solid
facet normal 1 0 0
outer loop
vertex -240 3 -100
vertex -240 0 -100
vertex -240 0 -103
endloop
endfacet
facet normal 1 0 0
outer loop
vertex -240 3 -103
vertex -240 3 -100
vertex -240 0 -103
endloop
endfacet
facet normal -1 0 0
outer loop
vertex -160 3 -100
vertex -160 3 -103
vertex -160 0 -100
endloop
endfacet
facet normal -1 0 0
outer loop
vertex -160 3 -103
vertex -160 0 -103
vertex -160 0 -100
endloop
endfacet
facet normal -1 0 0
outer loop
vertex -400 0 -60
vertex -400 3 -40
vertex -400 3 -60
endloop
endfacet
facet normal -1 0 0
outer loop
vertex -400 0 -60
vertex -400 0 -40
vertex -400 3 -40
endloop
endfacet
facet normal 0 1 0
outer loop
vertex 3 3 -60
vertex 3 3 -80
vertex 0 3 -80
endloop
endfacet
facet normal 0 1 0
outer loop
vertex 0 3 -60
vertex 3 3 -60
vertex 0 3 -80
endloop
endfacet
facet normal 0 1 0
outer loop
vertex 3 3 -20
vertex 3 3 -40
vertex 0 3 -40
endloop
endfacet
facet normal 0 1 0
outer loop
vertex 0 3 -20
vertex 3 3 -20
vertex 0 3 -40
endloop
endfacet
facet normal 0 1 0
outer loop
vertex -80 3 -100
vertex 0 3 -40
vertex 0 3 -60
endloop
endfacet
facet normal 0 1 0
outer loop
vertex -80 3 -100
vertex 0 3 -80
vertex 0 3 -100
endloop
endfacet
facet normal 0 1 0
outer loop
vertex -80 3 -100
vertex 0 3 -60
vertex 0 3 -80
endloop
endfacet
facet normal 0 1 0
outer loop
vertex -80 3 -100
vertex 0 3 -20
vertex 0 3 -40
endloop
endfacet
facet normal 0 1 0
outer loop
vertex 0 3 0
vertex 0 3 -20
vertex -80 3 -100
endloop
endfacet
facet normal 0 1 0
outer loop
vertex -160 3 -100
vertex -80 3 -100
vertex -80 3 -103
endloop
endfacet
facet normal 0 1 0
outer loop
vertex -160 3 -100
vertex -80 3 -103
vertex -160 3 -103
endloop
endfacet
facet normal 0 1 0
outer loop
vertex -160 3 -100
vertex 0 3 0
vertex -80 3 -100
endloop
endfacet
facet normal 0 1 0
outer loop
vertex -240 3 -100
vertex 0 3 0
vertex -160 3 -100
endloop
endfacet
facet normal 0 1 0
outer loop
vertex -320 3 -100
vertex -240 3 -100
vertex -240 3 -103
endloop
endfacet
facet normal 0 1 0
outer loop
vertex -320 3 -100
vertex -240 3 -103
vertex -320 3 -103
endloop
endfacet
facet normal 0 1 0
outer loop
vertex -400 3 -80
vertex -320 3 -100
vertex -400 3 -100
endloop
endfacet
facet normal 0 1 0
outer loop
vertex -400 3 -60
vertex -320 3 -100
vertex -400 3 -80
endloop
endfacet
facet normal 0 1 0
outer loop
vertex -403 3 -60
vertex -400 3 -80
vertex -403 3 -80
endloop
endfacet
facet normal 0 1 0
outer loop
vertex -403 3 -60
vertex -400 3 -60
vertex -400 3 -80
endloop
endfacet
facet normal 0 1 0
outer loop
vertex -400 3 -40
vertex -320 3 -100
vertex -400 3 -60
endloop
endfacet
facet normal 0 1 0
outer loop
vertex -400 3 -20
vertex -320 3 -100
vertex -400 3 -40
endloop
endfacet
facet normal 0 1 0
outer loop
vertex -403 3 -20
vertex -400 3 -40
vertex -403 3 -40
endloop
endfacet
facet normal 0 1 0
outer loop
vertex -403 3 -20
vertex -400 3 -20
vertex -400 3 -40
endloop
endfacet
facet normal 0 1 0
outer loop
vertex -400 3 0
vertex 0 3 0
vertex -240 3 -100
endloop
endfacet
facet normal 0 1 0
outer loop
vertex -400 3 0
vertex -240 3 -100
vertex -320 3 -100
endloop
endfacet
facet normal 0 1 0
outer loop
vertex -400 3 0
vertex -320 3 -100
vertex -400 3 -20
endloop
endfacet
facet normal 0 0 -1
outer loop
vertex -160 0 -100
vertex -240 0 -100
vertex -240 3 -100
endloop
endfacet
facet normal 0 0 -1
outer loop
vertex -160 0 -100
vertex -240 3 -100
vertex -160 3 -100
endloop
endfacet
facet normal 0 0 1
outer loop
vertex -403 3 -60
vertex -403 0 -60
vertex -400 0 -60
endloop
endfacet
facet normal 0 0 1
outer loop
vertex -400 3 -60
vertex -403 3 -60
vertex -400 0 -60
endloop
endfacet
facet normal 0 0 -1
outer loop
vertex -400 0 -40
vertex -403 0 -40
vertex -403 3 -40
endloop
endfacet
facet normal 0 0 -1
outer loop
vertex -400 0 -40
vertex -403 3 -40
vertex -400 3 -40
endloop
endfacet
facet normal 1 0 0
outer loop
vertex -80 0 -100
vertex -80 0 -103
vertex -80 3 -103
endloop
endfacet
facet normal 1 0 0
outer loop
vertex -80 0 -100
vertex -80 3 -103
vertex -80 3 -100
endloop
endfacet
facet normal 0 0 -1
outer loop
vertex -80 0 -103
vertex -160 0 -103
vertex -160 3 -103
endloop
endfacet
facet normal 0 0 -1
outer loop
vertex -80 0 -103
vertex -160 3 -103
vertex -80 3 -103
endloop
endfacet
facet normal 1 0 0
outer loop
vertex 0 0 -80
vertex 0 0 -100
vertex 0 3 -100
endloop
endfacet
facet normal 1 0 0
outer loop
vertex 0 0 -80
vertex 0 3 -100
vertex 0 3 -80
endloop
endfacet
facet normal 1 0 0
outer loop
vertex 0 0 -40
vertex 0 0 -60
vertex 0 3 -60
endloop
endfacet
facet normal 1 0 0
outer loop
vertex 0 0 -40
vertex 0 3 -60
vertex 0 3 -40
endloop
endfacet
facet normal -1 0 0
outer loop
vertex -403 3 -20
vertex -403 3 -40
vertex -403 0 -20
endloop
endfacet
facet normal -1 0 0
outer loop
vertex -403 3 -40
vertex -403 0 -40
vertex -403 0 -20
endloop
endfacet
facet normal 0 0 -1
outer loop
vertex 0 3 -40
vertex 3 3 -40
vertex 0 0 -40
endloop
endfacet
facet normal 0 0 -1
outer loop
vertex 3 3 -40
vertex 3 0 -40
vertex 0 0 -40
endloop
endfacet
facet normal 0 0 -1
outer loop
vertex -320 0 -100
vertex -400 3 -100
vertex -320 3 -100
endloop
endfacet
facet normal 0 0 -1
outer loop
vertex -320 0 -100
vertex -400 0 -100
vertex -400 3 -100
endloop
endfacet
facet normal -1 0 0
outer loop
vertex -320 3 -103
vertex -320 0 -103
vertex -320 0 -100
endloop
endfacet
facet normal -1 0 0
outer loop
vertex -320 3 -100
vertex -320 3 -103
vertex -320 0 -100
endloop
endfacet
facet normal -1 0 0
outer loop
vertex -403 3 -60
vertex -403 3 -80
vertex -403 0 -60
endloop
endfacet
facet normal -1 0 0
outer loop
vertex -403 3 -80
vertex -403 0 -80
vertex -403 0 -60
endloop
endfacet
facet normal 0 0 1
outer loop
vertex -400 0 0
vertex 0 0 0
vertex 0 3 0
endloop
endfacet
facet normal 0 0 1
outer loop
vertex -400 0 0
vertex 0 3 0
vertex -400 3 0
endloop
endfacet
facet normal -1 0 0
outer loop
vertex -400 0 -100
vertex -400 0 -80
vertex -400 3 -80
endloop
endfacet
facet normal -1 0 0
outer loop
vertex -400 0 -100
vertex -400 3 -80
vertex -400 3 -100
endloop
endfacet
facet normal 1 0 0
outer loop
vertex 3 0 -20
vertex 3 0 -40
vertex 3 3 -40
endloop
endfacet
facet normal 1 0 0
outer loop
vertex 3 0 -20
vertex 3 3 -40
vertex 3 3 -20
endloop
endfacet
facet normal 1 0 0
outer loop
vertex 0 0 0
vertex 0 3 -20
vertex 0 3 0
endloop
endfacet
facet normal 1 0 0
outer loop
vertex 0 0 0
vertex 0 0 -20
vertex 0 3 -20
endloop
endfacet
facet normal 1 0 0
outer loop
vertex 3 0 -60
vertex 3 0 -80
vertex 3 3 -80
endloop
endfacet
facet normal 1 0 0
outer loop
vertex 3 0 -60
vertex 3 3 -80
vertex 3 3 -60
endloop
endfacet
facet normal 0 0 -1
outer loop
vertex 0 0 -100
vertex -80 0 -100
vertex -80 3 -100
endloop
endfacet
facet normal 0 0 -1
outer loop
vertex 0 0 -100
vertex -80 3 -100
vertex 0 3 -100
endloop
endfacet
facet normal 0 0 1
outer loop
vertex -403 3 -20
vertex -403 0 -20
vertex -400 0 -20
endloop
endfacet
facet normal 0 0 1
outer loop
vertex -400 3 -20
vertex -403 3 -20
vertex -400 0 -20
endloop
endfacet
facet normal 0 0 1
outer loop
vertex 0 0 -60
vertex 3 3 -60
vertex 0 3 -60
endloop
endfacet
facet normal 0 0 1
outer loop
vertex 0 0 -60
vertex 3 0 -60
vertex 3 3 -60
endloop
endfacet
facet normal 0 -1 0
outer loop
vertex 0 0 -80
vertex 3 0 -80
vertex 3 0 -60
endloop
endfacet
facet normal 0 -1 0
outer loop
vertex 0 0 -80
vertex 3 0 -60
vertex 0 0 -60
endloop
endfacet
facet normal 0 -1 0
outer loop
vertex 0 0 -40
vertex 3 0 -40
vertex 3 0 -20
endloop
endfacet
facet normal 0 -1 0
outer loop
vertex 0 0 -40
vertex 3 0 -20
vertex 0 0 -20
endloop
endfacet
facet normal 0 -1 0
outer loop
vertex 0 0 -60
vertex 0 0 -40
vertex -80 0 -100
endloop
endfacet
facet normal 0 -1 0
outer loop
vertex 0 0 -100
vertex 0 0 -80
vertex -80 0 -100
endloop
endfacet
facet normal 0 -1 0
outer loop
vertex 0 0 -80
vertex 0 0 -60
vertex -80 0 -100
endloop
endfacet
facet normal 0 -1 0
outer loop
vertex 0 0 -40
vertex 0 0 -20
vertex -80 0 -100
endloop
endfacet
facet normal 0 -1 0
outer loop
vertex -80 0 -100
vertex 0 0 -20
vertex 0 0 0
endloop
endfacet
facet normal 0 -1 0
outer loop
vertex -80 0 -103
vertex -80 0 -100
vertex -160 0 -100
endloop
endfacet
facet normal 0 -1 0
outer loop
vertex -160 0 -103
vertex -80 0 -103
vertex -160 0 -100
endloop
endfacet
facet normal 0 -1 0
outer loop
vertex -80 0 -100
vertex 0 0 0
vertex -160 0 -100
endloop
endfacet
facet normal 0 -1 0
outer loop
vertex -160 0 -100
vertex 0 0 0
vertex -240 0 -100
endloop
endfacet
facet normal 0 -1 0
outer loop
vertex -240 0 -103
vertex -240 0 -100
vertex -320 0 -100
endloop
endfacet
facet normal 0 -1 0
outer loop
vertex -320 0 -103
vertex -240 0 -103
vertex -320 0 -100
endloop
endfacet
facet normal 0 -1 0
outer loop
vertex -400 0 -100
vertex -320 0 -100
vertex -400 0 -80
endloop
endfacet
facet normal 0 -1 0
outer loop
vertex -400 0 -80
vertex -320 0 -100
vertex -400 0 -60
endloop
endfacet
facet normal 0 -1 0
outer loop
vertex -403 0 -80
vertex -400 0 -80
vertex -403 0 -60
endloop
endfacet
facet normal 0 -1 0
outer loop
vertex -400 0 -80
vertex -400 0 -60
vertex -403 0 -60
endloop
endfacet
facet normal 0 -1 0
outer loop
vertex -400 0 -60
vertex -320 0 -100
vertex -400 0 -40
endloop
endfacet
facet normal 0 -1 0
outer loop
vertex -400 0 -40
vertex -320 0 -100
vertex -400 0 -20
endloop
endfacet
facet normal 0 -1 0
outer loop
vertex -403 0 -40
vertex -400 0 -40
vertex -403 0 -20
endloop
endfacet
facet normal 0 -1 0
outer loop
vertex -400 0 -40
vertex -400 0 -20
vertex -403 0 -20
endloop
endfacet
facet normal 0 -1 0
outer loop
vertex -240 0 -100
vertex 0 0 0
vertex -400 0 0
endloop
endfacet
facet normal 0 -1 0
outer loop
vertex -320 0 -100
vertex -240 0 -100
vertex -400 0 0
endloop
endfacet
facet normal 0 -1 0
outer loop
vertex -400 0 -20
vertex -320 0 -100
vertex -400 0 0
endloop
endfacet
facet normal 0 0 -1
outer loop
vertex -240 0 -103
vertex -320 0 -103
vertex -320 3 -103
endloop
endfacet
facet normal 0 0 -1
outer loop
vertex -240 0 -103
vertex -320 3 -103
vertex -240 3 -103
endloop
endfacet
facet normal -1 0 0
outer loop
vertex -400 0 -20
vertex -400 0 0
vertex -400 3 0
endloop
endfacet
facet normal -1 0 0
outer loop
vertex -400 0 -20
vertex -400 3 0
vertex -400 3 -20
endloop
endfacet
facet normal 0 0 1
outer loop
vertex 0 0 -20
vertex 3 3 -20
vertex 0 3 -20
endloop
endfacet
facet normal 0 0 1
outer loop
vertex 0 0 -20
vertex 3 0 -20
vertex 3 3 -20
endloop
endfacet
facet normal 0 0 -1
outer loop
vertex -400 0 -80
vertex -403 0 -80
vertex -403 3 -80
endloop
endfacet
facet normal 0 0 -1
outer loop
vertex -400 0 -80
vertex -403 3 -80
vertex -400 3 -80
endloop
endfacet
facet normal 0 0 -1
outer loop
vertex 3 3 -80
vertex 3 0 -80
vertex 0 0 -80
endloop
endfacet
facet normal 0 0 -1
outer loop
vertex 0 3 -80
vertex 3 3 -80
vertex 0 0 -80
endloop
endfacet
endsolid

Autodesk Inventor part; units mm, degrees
ref_plane "YZ Plane" through (0, 0, 0) normal (1, 0, 0) x (0, 1, 0)
ref_plane "XZ Plane" through (0, 0, 0) normal (0, 1, 0) x (-1, 0, 0)
ref_plane "XY Plane" through (0, 0, 0) normal (0, 0, 1) x (1, 0, 0)
sketch "Sketch1" plane through (0, 0, 0) normal (0, 1, 0) x (-1, 0, 0)
  line L0 (0, 0) -> (400, 0)
  line L1 (400, 0) -> (400, -100)
  line L2 (400, -100) -> (0, -100)
  line L3 (320, -103) -> (320, -100)
  line L4 (80, -103) -> (80, -100)
  line L5 (240, -100) -> (240, -103)
  line L6 (160, -103) -> (160, -100)
  line L7 (400, -25) -> (400, -50)
  line L8 (200, 0) -> (200, -100) construction
  line L9 (320, -103) -> (240, -103)
  line L10 (160, -103) -> (80, -103)
  line L11 (400, 0) -> (0, 0)
  line L12 (400, -100) -> (400, 0)
  line L13 (400, -25) -> (400, -50)
  line L14 (400, 0) -> (400, -100)
  line L15 (0, -100) -> (0, 0)
  line L16 (403, -80) -> (400, -80)
  line L17 (403, -80) -> (403, -60)
  line L18 (403, -60) -> (400, -60)
  line L19 (403, -40) -> (400, -40)
  line L20 (403, -40) -> (403, -20)
  line L21 (403, -20) -> (400, -20)
  line L22 (0, -25) -> (0, -50)
  line L23 (0, -25) -> (0, -50)
  line L24 (0, -100) -> (0, 0)
  line L25 (-3, -80) -> (0, -80)
  line L26 (-3, -80) -> (-3, -60)
  line L27 (-3, -60) -> (0, -60)
  line L28 (-3, -40) -> (0, -40)
  line L29 (-3, -40) -> (-3, -20)
  line L30 (-3, -20) -> (0, -20)
  dimension "d1" = 100
  dimension "d7" = 3
  dimension "d8" = 80
  dimension "d17" = 20
  dimension "d18" = 20
  dimension "d19" = 20
extrude "Extrusion1" add sketch "Sketch1" along normal blind 3
properties part number "Estante int"
